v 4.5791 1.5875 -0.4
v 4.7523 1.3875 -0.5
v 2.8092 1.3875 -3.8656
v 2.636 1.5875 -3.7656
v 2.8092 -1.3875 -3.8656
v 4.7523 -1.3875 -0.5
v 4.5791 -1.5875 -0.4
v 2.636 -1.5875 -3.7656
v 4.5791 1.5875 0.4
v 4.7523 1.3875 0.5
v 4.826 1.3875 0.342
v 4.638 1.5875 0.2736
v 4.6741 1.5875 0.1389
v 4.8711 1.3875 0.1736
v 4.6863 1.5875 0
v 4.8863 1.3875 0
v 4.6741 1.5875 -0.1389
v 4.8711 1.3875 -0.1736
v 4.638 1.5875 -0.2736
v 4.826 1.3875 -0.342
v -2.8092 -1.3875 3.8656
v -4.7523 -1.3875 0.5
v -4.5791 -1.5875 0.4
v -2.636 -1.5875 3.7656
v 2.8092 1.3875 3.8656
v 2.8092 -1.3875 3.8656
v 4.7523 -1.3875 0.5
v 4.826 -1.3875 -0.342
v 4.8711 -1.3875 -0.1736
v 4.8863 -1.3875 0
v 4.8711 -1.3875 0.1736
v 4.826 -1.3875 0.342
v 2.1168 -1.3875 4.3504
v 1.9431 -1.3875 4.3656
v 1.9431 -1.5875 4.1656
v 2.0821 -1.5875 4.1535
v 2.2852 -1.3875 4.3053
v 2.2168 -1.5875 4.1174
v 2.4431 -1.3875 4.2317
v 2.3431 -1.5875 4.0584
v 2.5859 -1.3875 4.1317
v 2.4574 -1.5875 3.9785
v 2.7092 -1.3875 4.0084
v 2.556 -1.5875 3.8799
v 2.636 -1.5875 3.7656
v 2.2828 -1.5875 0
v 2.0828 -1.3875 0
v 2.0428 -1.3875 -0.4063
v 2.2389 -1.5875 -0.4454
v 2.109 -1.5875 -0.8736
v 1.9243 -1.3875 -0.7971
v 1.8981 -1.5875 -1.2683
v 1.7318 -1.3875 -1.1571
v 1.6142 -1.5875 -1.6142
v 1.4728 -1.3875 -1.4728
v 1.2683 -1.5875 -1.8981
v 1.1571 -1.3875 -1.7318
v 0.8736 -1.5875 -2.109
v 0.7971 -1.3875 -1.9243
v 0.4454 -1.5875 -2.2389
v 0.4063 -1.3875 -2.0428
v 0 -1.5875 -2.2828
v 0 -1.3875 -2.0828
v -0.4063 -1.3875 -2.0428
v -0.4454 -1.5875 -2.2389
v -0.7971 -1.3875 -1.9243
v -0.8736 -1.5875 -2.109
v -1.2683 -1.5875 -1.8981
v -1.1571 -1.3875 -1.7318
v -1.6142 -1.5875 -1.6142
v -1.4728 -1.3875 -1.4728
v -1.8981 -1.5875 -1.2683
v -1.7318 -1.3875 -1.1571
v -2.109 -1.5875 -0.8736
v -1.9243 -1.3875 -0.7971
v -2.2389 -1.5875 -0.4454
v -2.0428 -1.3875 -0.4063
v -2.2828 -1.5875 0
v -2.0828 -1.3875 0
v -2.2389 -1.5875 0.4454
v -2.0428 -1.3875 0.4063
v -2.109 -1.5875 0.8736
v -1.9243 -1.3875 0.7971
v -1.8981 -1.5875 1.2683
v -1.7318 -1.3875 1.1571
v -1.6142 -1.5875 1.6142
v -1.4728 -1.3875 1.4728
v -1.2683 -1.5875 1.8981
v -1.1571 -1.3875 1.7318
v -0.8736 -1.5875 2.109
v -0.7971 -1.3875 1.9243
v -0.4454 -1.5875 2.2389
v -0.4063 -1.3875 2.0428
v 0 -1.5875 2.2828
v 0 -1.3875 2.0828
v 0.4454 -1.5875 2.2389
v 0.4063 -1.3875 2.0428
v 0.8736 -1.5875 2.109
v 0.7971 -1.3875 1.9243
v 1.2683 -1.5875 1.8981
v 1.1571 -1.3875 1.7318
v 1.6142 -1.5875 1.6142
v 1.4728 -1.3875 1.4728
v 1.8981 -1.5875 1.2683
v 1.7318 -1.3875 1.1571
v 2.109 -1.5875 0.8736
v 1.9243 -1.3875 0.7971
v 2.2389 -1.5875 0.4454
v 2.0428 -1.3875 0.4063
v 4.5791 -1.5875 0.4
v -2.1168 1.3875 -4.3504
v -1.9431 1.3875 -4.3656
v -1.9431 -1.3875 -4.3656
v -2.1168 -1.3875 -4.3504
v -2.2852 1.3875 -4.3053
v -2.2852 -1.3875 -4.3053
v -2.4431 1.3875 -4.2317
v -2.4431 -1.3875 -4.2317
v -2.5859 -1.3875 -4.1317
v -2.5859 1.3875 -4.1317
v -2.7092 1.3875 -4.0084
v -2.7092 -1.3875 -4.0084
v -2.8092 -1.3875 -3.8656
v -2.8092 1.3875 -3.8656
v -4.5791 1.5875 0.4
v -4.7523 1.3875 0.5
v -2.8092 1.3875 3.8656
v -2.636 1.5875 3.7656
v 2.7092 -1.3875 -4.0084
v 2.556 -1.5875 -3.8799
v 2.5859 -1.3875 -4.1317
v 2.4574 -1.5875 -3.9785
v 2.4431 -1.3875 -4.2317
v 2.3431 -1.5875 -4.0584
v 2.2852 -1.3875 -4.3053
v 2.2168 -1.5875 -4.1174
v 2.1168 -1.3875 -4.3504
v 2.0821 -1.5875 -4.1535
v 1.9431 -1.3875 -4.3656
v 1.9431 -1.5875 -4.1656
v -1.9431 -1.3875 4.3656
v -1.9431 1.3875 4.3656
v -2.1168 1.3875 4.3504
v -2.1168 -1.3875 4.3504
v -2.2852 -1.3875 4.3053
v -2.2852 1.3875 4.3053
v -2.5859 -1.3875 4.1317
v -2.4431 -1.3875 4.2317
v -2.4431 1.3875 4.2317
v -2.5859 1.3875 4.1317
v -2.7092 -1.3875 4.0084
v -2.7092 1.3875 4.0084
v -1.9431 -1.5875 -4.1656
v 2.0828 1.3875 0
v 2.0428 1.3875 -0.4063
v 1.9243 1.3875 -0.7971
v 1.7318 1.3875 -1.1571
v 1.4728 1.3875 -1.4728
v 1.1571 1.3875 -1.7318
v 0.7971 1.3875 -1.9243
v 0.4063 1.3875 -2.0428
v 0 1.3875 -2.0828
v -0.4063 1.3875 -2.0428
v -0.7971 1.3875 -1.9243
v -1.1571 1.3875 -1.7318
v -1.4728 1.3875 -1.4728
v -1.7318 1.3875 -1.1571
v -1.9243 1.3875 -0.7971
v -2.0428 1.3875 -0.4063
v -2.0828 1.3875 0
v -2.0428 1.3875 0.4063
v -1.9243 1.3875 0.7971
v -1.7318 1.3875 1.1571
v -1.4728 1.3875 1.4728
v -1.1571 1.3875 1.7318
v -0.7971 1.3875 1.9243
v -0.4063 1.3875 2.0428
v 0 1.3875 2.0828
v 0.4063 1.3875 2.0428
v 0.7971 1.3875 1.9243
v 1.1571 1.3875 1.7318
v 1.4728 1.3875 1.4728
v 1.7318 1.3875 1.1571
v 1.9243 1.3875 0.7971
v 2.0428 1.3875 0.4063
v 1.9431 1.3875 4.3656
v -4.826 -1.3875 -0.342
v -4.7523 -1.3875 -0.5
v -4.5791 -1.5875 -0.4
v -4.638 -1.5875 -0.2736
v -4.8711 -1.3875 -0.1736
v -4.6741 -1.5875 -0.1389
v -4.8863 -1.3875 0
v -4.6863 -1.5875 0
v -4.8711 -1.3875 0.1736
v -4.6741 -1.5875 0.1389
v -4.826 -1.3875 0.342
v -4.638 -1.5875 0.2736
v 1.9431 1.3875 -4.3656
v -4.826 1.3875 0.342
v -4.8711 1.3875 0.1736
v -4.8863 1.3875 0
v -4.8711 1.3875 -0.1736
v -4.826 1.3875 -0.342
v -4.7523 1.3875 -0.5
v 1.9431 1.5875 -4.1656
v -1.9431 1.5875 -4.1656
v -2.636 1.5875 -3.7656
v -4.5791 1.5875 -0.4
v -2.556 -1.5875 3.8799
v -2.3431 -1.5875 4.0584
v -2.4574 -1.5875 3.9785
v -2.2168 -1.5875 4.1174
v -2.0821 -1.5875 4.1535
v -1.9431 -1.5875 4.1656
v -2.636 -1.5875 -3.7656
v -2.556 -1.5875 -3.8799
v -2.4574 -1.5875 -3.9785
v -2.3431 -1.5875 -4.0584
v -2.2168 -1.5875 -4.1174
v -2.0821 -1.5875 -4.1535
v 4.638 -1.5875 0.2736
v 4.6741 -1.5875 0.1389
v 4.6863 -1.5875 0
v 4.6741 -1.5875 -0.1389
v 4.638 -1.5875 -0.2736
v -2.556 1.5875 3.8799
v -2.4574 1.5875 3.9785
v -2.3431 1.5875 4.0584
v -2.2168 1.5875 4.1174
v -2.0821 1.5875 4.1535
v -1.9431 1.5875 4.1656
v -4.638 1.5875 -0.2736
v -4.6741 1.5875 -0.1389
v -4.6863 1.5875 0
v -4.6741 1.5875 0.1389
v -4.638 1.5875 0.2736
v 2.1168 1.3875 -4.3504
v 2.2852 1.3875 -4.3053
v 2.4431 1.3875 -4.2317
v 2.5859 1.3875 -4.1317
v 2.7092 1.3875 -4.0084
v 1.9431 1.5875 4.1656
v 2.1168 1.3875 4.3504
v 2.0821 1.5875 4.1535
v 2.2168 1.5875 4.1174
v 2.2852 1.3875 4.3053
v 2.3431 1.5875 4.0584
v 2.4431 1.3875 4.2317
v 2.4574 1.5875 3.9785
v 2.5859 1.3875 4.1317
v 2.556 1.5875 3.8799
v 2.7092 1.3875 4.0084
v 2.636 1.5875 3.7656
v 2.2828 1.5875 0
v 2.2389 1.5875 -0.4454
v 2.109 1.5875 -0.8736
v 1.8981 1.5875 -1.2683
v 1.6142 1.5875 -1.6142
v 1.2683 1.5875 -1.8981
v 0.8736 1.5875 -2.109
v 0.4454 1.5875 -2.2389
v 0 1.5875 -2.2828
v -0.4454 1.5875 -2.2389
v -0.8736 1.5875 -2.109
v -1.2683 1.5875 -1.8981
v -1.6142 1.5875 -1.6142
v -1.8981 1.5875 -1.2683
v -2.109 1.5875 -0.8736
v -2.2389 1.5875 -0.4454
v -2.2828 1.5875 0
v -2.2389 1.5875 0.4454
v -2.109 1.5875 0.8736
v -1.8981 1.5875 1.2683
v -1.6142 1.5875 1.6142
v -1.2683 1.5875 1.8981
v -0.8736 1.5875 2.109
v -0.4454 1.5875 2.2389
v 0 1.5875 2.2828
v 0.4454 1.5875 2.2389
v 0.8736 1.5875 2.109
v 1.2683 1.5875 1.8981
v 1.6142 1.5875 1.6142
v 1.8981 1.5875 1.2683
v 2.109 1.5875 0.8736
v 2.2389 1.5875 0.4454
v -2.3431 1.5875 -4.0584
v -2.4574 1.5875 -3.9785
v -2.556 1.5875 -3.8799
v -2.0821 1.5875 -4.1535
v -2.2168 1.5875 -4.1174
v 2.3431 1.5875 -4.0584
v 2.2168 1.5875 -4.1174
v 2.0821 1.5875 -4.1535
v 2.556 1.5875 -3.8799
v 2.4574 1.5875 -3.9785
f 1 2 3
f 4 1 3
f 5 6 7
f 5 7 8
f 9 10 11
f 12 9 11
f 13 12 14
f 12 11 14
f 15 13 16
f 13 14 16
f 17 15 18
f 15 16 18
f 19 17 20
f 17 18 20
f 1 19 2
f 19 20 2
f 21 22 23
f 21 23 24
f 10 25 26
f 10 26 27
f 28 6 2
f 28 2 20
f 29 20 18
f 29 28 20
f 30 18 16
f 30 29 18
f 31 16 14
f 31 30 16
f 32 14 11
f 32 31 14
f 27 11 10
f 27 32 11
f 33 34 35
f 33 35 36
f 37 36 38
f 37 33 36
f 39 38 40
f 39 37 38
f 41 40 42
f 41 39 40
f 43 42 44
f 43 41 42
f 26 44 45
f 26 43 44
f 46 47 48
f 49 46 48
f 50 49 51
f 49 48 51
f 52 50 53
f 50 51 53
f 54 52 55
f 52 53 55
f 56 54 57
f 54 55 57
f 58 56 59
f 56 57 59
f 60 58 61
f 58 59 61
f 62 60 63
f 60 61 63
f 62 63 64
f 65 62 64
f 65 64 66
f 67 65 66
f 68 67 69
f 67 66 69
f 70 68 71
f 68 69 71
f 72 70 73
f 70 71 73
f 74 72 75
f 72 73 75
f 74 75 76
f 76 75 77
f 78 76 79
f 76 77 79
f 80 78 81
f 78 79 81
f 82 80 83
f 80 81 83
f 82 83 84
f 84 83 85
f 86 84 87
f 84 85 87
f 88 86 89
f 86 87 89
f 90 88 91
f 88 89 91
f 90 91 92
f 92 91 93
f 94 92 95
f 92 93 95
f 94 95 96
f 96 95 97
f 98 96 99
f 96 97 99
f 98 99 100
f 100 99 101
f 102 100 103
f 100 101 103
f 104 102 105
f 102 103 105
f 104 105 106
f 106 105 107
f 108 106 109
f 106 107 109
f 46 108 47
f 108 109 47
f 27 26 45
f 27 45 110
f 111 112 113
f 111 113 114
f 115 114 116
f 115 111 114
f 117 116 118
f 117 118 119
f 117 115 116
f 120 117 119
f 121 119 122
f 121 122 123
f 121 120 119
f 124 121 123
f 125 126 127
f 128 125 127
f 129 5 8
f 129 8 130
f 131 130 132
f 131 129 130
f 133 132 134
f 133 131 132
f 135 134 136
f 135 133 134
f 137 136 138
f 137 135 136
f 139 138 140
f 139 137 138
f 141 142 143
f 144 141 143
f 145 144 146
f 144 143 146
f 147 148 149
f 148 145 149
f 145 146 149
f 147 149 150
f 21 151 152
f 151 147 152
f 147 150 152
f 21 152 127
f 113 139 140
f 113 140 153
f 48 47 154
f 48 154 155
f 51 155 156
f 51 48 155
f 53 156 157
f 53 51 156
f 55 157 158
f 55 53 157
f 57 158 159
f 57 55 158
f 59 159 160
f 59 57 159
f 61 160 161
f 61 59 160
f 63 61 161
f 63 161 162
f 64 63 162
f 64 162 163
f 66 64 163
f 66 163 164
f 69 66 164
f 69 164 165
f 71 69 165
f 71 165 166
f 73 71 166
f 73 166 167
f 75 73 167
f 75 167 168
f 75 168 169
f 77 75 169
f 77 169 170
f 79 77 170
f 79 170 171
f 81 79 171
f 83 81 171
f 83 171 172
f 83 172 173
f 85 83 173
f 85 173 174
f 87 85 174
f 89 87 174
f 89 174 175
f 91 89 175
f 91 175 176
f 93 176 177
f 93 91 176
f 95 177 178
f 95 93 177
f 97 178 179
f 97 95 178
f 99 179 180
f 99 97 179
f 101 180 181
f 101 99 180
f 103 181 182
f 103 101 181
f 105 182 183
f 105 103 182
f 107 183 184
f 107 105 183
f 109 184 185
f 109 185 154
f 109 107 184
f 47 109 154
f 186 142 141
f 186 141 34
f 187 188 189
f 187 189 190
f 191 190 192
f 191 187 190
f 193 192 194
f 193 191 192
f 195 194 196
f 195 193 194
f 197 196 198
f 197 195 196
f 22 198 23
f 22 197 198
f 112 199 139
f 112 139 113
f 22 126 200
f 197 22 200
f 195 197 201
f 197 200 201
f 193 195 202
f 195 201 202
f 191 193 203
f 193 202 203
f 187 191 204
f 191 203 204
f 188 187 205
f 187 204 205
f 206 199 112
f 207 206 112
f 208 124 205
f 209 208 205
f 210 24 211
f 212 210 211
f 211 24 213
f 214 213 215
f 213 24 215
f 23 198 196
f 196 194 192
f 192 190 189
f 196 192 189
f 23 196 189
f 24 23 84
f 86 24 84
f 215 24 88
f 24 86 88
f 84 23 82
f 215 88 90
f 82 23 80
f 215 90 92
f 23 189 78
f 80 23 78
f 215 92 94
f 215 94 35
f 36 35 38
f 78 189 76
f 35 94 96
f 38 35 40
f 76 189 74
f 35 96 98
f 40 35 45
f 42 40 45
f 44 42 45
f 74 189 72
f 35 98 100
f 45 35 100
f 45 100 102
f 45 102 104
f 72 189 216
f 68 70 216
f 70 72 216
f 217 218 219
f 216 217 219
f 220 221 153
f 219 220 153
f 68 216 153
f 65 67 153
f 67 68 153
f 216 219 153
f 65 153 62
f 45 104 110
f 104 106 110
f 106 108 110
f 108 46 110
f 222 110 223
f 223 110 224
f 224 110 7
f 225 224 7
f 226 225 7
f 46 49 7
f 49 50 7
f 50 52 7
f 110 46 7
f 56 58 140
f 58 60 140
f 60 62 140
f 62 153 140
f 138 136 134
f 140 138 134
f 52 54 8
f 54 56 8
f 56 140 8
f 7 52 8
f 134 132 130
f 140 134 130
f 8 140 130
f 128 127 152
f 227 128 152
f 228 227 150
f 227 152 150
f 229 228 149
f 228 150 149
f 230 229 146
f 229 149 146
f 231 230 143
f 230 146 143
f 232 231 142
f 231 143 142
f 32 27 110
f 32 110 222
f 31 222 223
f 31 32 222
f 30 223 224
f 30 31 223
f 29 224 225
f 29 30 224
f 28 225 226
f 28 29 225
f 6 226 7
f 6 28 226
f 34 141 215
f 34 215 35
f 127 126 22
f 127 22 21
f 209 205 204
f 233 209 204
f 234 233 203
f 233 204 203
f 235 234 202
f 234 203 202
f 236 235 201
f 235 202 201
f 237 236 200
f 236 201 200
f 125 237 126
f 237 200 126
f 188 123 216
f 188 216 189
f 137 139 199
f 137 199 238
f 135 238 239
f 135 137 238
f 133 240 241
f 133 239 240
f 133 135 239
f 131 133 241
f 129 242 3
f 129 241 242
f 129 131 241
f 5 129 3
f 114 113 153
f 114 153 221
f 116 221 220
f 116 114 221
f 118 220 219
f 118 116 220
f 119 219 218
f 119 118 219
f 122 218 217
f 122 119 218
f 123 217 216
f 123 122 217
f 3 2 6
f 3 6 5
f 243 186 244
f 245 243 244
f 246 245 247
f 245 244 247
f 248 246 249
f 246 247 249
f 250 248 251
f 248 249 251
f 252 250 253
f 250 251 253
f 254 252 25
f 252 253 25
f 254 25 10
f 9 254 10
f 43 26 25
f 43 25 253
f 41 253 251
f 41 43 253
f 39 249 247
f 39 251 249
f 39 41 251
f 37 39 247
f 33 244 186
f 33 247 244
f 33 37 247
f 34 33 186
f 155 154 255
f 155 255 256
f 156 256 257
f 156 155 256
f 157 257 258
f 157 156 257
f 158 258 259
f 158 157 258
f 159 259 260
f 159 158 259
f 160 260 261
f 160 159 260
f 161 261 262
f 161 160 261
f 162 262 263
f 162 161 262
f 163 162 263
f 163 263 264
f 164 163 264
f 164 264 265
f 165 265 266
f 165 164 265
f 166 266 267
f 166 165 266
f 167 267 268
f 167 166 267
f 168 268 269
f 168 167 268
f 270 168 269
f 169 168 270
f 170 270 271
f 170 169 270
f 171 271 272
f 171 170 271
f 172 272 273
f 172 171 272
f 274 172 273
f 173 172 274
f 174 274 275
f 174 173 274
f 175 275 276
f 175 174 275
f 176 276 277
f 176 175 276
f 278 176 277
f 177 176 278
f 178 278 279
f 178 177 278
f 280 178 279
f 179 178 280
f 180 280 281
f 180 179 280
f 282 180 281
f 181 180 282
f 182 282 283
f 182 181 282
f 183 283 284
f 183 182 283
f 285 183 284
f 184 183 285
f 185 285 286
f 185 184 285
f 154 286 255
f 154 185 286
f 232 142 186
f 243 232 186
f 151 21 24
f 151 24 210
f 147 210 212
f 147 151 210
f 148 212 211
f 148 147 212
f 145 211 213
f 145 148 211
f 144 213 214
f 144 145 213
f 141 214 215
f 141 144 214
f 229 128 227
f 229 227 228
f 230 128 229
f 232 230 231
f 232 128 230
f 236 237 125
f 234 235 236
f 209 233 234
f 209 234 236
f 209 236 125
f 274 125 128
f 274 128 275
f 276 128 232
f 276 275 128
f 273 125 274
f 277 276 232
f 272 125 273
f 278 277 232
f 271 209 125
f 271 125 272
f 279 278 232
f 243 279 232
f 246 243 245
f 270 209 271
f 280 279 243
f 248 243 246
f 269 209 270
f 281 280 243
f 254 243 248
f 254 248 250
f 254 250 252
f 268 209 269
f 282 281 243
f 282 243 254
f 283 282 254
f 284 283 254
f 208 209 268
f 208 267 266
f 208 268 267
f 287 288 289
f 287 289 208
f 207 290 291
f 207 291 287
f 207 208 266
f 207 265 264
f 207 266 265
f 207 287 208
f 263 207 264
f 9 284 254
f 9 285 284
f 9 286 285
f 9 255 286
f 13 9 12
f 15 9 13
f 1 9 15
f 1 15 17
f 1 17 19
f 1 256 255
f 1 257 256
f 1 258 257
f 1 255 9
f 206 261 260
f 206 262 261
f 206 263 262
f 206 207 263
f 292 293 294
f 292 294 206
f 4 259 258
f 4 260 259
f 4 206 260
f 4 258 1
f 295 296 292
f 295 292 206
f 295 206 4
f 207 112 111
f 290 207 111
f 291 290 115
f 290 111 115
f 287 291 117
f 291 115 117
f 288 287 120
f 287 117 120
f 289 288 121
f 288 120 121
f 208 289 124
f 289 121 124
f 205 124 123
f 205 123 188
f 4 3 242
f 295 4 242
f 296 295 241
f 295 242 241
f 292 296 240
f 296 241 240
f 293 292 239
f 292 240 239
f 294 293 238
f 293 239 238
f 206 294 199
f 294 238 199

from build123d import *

# Parameters (mm, degrees)
SKETCH1_R           = 2.0828
BOSS_EXTRUDE1_DEPTH = 1.5875
FILLET1_R           = 1
CHAMFER1_SIZE       = 0.2


with BuildPart() as part:
    # Sketch1 → Boss-Extrude1 (new body, symmetric)
    with BuildSketch(Plane(origin=(0, 0, 0), x_dir=(1, 0, 0), z_dir=(0, 1, 0))):
        Polygon((2.520494769, 4.365625), (-2.520494769, 4.365625), (-5.040989538, 0), (-2.520494769, -4.365625), (2.520494769, -4.365625), (5.040989538, 0), align=None)
        Circle(SKETCH1_R, mode=Mode.SUBTRACT)
    extrude(amount=BOSS_EXTRUDE1_DEPTH, both=True)

    # Fillet1
    fillet1_edges = [part.edges().sort_by_distance(p)[0] for p in [
        (5.040989538, 0, 0),
        (2.520494769, 0, 4.365625),
        (-2.520494769, 0, 4.365625),
        (-5.040989538, 0, 0),
        (-2.520494769, 0, -4.365625),
        (2.520494769, 0, -4.365625),
    ]]
    fillet(fillet1_edges, radius=FILLET1_R)

    # Chamfer1
    chamfer1_edges = [part.edges().sort_by_distance(p)[0] for p in [
        (-2.0828, -1.5875, 0),
        (-2.0828, 1.5875, 0),
        (3.780742153, -1.5875, -2.1828125),
        (3.780742153, 1.5875, -2.1828125),
        (3.780742153, -1.5875, 2.1828125),
        (0, -1.5875, 4.365625),
        (-3.780742153, -1.5875, 2.1828125),
        (-3.780742153, -1.5875, -2.1828125),
        (0, -1.5875, -4.365625),
        (-2.4431445, -1.5875, 4.231650404),
        (2.4431445, -1.5875, -4.231650404),
        (-2.4431445, -1.5875, -4.231650404),
        (-4.886288999, -1.5875, 0),
        (2.4431445, -1.5875, 4.231650404),
        (4.886288999, -1.5875, 0),
        (3.780742153, 1.5875, 2.1828125),
        (0, 1.5875, -4.365625),
        (-3.780742153, 1.5875, -2.1828125),
        (-3.780742153, 1.5875, 2.1828125),
        (0, 1.5875, 4.365625),
        (-2.4431445, 1.5875, 4.231650404),
        (2.4431445, 1.5875, -4.231650404),
        (-2.4431445, 1.5875, -4.231650404),
        (-4.886288999, 1.5875, 0),
        (2.4431445, 1.5875, 4.231650404),
        (4.886288999, 1.5875, 0),
    ]]
    chamfer(chamfer1_edges, length=CHAMFER1_SIZE)


solid = part.part
